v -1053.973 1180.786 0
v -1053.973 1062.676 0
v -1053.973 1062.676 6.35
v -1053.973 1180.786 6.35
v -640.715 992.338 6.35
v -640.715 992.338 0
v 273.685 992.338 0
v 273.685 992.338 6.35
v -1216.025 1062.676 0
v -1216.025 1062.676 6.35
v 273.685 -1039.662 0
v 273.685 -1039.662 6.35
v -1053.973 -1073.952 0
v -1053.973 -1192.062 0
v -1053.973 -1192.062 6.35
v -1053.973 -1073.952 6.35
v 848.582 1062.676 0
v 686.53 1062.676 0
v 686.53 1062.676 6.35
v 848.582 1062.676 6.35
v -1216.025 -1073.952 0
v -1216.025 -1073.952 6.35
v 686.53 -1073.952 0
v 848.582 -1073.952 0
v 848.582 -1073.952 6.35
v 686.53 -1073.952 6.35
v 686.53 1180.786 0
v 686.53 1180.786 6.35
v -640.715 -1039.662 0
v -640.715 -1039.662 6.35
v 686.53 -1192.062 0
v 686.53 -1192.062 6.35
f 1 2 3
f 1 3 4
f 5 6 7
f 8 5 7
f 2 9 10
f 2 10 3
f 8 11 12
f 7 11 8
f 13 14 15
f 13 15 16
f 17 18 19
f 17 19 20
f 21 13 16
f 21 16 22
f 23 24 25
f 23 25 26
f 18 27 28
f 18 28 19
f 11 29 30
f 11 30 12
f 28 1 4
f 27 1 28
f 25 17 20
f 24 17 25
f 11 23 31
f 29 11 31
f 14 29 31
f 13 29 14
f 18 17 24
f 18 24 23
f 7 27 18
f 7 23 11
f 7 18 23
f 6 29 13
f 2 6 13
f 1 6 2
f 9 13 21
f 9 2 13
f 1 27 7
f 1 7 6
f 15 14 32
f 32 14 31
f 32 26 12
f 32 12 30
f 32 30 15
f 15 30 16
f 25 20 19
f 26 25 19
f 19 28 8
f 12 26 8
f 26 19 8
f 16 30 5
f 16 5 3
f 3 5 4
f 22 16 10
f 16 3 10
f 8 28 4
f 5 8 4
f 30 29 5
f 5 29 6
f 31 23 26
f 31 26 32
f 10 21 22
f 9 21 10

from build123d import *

# Parameters (mm, degrees)
SKETCH1_W           = 914.4
SKETCH1_H           = 2032
BOSS_EXTRUDE2_DEPTH = 6.35


with BuildPart() as part:
    # Sketch1 → Boss-Extrude2 (new body)
    with BuildSketch(Plane.XY):
        Polygon((686.529697289, 1180.785588374), (686.529697289, 1062.675588374), (848.581697289, 1062.675588374), (848.581697289, -1073.952151658), (686.529697289, -1073.952151658), (686.529697289, -1192.062151658), (477.952095391, -1192.062151658), (-436.447904609, -1192.062151658), (-1053.973, -1192.062151658), (-1053.973, -1073.952151658), (-1216.025, -1073.952151658), (-1216.025, 1062.675588374), (-1053.973, 1062.675588374), (-1053.973, 1180.785588374), align=None)
        with Locations((-183.515, -23.662151658)):
            Rectangle(SKETCH1_W, SKETCH1_H, mode=Mode.SUBTRACT)
    extrude(amount=BOSS_EXTRUDE2_DEPTH)


solid = part.part
